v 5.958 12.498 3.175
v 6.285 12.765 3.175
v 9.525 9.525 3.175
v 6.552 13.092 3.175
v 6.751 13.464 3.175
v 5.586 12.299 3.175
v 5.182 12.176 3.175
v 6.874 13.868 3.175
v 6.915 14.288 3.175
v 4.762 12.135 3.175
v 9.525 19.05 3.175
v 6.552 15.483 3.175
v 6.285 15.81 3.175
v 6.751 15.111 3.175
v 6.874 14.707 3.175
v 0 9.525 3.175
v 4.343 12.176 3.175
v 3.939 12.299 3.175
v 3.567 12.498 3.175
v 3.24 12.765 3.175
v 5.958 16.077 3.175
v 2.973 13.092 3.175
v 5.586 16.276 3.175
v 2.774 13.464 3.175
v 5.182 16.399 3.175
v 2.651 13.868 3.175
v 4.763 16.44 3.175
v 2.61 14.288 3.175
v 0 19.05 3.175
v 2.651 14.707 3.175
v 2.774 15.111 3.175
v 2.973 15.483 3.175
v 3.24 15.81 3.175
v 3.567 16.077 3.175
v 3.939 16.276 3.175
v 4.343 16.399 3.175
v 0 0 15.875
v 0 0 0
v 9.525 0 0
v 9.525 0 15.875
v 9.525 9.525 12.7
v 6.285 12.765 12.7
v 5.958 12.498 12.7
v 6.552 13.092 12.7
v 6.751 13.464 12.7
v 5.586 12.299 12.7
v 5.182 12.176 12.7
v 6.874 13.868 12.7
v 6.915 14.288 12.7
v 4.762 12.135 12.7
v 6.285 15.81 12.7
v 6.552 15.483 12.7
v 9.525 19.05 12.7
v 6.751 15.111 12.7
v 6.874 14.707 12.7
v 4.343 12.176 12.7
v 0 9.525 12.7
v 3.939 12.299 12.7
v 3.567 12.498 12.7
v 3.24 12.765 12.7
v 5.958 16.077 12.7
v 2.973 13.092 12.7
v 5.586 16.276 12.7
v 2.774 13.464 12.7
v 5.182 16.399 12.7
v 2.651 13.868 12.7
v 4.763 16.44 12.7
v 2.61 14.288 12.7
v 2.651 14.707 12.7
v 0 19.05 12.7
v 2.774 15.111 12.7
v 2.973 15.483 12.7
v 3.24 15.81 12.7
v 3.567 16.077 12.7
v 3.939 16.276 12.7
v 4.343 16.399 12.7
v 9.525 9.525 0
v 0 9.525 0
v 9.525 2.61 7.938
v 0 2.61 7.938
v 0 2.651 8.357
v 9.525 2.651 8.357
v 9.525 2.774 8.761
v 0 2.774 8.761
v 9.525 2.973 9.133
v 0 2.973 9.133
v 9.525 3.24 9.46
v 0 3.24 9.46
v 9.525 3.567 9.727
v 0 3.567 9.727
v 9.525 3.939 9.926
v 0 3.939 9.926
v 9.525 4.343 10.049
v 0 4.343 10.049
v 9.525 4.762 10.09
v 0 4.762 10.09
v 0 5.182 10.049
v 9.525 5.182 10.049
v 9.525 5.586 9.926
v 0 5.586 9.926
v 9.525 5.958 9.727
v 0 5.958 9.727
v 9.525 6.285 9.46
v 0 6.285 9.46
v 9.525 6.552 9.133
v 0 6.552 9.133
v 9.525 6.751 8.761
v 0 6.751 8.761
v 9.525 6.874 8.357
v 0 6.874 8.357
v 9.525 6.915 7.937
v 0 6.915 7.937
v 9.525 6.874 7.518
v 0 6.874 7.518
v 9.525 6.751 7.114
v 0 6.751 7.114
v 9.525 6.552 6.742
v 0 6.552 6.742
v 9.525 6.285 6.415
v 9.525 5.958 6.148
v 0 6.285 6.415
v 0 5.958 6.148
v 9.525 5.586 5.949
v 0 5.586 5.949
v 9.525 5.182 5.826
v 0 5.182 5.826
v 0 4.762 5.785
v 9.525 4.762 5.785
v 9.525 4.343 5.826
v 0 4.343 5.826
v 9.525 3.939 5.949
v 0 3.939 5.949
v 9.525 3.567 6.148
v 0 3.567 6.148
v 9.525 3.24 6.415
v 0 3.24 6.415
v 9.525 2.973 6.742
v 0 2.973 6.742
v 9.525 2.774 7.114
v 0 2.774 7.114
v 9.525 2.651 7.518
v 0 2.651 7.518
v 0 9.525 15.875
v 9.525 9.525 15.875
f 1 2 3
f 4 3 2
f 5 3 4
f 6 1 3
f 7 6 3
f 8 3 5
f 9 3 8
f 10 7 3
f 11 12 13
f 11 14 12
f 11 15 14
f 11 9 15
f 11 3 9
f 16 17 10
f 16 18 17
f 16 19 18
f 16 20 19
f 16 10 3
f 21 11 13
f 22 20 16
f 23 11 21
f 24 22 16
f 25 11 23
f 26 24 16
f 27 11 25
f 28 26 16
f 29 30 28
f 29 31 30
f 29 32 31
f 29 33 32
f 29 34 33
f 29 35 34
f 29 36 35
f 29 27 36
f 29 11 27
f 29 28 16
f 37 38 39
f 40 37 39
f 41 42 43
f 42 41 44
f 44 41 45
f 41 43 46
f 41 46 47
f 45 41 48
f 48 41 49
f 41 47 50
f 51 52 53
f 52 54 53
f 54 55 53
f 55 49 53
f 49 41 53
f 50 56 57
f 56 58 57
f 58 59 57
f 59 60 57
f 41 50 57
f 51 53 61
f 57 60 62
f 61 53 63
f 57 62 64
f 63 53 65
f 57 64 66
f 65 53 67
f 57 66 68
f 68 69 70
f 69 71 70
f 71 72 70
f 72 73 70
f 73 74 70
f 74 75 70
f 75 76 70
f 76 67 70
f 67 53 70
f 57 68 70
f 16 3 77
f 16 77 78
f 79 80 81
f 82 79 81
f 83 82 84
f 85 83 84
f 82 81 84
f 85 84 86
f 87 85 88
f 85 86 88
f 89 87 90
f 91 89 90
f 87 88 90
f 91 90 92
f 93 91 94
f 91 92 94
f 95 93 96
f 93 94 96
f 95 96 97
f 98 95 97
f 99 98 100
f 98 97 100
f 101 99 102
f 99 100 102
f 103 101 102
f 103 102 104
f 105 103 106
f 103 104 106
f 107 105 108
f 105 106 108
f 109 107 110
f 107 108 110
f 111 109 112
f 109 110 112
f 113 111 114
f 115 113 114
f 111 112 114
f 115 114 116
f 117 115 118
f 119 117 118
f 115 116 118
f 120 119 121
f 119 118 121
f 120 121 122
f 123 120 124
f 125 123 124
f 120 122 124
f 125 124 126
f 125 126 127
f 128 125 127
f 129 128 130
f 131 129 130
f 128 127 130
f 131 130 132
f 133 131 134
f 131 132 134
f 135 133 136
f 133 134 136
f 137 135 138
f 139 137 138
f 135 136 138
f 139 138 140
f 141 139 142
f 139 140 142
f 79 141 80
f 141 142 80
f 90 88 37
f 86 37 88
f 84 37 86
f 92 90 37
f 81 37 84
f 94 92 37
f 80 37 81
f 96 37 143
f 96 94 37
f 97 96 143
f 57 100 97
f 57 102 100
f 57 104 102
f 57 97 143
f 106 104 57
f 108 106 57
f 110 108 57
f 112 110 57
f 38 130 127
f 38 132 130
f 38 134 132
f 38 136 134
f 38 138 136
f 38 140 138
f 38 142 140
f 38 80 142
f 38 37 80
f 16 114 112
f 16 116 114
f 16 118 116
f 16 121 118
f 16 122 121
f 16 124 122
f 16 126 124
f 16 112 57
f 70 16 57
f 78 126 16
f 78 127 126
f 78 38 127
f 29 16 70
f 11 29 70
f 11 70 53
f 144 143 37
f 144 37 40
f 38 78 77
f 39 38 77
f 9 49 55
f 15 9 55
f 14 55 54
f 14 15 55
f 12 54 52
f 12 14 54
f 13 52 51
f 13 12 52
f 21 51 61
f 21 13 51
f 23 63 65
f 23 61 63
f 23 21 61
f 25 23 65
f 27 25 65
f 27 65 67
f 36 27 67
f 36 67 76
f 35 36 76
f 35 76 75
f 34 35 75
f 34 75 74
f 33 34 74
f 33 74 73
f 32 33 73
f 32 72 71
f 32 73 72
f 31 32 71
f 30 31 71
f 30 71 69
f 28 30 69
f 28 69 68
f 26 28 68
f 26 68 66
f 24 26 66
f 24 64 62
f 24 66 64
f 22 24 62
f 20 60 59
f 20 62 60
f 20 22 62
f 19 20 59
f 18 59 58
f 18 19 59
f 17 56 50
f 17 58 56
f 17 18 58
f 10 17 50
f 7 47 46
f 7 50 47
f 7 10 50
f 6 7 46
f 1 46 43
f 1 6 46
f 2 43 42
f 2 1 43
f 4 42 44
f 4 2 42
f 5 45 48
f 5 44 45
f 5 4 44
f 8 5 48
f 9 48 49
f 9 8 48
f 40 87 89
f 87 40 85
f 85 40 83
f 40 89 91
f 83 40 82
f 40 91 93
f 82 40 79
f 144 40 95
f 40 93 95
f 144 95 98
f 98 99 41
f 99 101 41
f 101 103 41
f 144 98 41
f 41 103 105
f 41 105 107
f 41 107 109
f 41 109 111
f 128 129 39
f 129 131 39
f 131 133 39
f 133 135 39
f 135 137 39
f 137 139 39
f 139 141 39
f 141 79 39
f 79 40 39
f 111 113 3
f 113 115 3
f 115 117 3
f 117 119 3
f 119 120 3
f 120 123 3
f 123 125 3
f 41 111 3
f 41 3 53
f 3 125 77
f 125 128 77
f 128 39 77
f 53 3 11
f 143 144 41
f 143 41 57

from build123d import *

# Parameters (mm, degrees)
F0_W     = 9.525
F0_H     = 19.05
F0_R     = 2.15265
F1_DEPTH = 15.875
F2_W     = 9.525
F2_H     = 3.175
F3_DEPTH = 9.525
F4_R     = 2.15265
F5_DEPTH = 9.525


with BuildPart() as f1:
    # F0 (on Top) → F1 (new body)
    with BuildSketch(Plane.XY):
        with Locations((4.7625, 9.525)):
            Rectangle(F0_W, F0_H)
        with Locations((4.7625, 14.2875)):
            Circle(F0_R, mode=Mode.SUBTRACT)
    extrude(amount=F1_DEPTH)

    # F2 (on face) → F3 (cut)
    with BuildSketch(Plane(origin=(0, 19.05, 0), x_dir=(-1, 0, 0), z_dir=(0, 1, 0))):
        with Locations((-4.7625, 1.5875)):
            Rectangle(F2_W, F2_H)
        with Locations((-4.7625, 14.2875)):
            Rectangle(F2_W, F2_H)
    extrude(amount=-F3_DEPTH, mode=Mode.SUBTRACT)

    # F4 (on face) → F5 (cut, through all)
    with BuildSketch(Plane(origin=(0, 0, 0), x_dir=(0, -1, 0), z_dir=(-1, 0, 0))):
        with Locations((-4.7625, 7.9375)):
            Circle(F4_R)
    extrude(amount=-F5_DEPTH, mode=Mode.SUBTRACT)


solid = f1.part
